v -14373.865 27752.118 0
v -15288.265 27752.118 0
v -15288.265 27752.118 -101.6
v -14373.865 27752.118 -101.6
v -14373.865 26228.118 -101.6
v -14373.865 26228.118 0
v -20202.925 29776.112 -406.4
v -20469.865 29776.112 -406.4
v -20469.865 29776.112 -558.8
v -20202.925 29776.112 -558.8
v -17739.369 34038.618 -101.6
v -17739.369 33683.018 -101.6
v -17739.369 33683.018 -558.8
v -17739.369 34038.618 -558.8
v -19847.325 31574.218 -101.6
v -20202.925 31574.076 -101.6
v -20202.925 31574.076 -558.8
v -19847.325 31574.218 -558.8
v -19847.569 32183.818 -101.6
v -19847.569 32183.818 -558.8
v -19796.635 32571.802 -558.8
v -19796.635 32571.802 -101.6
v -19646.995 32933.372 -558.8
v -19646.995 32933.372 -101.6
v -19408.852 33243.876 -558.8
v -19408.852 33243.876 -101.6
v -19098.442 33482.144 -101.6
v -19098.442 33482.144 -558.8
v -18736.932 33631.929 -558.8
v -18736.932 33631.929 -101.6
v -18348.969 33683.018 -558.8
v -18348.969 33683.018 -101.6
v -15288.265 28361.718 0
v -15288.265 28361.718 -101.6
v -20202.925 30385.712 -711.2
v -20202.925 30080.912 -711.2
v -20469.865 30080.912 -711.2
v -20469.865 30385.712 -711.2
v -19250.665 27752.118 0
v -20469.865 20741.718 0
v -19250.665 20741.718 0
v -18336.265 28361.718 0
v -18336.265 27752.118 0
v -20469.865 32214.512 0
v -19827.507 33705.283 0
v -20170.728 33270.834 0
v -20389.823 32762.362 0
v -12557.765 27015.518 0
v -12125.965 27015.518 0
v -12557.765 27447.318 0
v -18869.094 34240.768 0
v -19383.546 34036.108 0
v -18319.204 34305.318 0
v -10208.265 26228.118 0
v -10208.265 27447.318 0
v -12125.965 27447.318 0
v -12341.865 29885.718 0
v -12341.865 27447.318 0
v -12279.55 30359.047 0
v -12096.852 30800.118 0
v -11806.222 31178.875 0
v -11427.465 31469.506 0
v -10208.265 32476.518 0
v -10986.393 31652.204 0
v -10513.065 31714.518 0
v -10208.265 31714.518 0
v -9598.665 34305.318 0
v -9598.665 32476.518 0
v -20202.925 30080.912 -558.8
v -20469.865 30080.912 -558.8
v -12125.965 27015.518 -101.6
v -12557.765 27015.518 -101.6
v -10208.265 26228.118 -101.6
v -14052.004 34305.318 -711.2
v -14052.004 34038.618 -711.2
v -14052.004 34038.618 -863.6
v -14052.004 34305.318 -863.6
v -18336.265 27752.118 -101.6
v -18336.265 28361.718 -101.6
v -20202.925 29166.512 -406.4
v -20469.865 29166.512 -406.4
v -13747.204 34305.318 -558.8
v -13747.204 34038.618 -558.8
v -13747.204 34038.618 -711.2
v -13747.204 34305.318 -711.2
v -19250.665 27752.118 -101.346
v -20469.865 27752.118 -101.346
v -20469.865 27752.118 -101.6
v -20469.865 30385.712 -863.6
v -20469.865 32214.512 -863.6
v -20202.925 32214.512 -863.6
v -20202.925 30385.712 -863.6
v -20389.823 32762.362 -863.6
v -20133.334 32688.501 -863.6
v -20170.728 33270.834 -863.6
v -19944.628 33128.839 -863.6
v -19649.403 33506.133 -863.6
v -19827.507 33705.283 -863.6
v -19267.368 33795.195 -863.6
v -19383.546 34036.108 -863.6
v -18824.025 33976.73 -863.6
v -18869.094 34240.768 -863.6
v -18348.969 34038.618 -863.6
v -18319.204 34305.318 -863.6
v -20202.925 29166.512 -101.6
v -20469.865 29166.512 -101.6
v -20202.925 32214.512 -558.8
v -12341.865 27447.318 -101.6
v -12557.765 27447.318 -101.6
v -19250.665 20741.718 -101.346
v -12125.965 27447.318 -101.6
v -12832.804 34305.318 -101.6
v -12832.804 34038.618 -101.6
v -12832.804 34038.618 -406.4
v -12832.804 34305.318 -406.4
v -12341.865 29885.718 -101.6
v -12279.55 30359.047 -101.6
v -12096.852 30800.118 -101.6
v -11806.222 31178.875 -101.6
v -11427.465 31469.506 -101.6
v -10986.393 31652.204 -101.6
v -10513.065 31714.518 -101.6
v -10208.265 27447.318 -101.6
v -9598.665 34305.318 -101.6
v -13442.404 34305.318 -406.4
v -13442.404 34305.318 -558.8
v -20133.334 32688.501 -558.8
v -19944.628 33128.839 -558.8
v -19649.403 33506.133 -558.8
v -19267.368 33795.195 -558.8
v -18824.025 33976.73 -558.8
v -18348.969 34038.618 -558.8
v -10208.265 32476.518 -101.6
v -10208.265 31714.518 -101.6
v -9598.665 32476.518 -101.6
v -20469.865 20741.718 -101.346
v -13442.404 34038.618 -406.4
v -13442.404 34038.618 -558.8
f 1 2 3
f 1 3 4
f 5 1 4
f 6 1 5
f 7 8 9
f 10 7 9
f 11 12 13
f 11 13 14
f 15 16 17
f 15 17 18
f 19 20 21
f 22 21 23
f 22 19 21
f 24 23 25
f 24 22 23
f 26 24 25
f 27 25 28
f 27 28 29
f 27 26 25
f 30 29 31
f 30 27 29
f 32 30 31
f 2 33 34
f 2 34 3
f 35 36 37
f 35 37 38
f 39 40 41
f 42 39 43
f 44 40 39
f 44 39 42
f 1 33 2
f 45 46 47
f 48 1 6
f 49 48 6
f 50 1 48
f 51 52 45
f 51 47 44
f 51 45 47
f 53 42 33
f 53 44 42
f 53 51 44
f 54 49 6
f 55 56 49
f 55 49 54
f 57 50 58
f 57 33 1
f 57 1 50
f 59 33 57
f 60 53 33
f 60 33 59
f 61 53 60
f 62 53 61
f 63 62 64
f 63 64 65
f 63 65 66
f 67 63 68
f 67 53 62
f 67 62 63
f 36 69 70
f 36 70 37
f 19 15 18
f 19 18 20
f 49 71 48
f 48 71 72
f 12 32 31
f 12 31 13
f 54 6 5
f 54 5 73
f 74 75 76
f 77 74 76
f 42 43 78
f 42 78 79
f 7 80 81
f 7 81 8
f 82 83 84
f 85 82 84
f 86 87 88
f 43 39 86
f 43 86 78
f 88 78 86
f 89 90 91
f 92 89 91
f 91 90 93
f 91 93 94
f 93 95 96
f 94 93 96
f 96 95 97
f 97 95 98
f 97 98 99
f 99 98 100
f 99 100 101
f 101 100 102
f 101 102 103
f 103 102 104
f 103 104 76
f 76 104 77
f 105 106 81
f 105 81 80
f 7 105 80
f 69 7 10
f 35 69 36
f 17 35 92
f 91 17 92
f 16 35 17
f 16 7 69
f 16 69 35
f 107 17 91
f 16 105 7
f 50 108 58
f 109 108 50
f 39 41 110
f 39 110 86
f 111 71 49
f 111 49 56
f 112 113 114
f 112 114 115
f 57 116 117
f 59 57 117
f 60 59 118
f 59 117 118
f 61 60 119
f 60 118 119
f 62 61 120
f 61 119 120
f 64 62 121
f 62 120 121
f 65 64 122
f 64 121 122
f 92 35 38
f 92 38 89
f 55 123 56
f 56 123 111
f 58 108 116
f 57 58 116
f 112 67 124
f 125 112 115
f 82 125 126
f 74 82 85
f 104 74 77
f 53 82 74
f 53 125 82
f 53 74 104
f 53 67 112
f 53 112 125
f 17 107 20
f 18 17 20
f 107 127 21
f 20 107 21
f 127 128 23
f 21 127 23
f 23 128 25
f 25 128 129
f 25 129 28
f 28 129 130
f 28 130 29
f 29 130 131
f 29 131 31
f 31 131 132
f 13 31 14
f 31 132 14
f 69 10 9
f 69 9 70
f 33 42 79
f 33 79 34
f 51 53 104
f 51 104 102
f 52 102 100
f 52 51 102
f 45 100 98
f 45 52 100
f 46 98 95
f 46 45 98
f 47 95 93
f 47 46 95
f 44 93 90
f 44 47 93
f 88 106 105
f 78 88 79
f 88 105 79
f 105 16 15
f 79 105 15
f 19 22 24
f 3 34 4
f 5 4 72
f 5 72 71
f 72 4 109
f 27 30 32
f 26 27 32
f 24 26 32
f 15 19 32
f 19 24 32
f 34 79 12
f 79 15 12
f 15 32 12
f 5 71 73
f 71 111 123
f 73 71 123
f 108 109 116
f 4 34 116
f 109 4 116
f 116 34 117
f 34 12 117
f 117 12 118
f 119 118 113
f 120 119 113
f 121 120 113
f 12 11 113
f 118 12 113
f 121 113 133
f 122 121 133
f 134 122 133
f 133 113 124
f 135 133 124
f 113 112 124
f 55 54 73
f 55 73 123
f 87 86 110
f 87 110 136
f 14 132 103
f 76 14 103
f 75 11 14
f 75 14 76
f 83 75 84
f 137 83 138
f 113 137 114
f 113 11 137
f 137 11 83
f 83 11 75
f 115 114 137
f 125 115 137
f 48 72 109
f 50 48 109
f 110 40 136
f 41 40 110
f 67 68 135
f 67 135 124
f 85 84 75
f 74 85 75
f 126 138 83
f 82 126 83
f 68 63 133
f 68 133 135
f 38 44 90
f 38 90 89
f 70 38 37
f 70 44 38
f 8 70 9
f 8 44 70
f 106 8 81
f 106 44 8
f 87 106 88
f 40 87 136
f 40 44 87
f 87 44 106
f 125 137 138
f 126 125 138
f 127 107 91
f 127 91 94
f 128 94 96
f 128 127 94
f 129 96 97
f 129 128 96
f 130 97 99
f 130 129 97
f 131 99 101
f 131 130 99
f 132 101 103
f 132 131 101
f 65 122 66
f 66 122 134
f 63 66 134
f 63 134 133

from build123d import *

# Parameters (mm, degrees)
BOSS_EXTRUDE1_DEPTH = 101.6
BOSS_EXTRUDE2_DEPTH = 558.8
BOSS_EXTRUDE3_DEPTH = 863.6
CUT_EXTRUDE1_DEPTH  = 24425.756146057
CUT_EXTRUDE2_DEPTH  = 35918.479626981
CUT_EXTRUDE3_DEPTH  = 39956.790586087
SKETCH6_W           = 431.8
SKETCH6_H           = 431.8
CUT_EXTRUDE4_DEPTH  = 39956.790586087
SKETCH7_W           = 1219.2
SKETCH7_H           = 7010.4
CUT_EXTRUDE5_DEPTH  = 0.254


with BuildPart() as part:
    # Sketch1 → Boss-Extrude1 (new body)
    with BuildSketch(Plane.XY):
        with BuildLine():
            Line((-20469.8646362, 20741.718375844), (-19250.6646362, 20741.718375844))
            Line((-19250.6646362, 20741.718375844), (-19250.6646362, 27752.118375844))
            Line((-19250.6646362, 27752.118375844), (-18336.2646362, 27752.118375844))
            Line((-18336.2646362, 27752.118375844), (-18336.2646362, 28361.718375844))
            Line((-18336.2646362, 28361.718375844), (-15288.2646362, 28361.718375844))
            Line((-15288.2646362, 28361.718375844), (-15288.2646362, 27752.118375844))
            Line((-15288.2646362, 27752.118375844), (-14373.8646362, 27752.118375844))
            Line((-14373.8646362, 27752.118375844), (-14373.8646362, 26228.118375844))
            Line((-14373.8646362, 26228.118375844), (-10208.2646362, 26228.118375844))
            Line((-10208.2646362, 26228.118375844), (-10208.2646362, 32476.518375844))
            Line((-10208.2646362, 32476.518375844), (-9598.6646362, 32476.518375844))
            Line((-9598.6646362, 32476.518375844), (-9598.6646362, 34305.318375844))
            Line((-9598.6646362, 34305.318375844), (-12832.803535515, 34305.318375844))
            Line((-12832.803535515, 34305.318375844), (-12832.803535515, 34038.618375844))
            Line((-12832.803535515, 34038.618375844), (-17739.369265567, 34038.618375844))
            Line((-17739.369265567, 34038.618375844), (-17739.369265567, 33683.018375844))
            Line((-17739.369265567, 33683.018375844), (-18348.969265567, 33683.018375844))
            ThreePointArc((-18348.969265567, 33683.018375844), (-19408.851608728, 33243.876434785), (-19847.569145444, 32183.818347357))
            Line((-19847.569145444, 32183.818347357), (-19847.325066059, 31574.218396221))
            Line((-19847.325066059, 31574.218396221), (-20202.925037555, 31574.07601658))
            Line((-20202.925037555, 31574.07601658), (-20202.925037555, 29166.512154459))
            Line((-20202.925037555, 29166.512154459), (-20469.8646362, 29166.512154459))
            Line((-20469.8646362, 29166.512154459), (-20469.8646362, 20741.718375844))
        make_face()
    extrude(amount=-BOSS_EXTRUDE1_DEPTH)

    # Sketch1<15> → Boss-Extrude2 (add)
    with BuildSketch(Plane.XY):
        with BuildLine():
            Line((-20202.925037555, 32214.512154459), (-20202.925037555, 31574.07601658))
            Line((-20202.925037555, 31574.07601658), (-19847.325066059, 31574.218396221))
            Line((-19847.325066059, 31574.218396221), (-19847.569145444, 32183.818347357))
            ThreePointArc((-19847.569145444, 32183.818347357), (-19408.851608728, 33243.876434785), (-18348.969265567, 33683.018375844))
            Line((-18348.969265567, 33683.018375844), (-17739.369265567, 33683.018375844))
            Line((-17739.369265567, 33683.018375844), (-17739.369265567, 34038.618375844))
            Line((-17739.369265567, 34038.618375844), (-18348.969265567, 34038.618375844))
            ThreePointArc((-18348.969265567, 34038.618375844), (-19649.403376872, 33506.132702828), (-20202.925037555, 32214.512154459))
        make_face()
    extrude(amount=-BOSS_EXTRUDE2_DEPTH)

    # Sketch1<17> → Boss-Extrude3 (add)
    with BuildSketch(Plane.XY):
        with BuildLine():
            Line((-20469.864636201, 32214.512154459), (-20469.8646362, 29166.512154459))
            Line((-20469.8646362, 29166.512154459), (-20202.925037555, 29166.512154459))
            Line((-20202.925037555, 29166.512154459), (-20202.925037555, 31574.07601658))
            Line((-20202.925037555, 31574.07601658), (-20202.925037555, 32214.512154459))
            ThreePointArc((-20202.925037555, 32214.512154459), (-19649.403376872, 33506.132702828), (-18348.969265567, 34038.618375844))
            Line((-18348.969265567, 34038.618375844), (-17739.369265567, 34038.618375844))
            Line((-17739.369265567, 34038.618375844), (-12832.803535515, 34038.618375844))
            Line((-12832.803535515, 34038.618375844), (-12832.803535515, 34305.318375844))
            Line((-12832.803535515, 34305.318375844), (-18319.203535515, 34305.318375844))
            ThreePointArc((-18319.203535515, 34305.318375844), (-19827.50687323, 33705.283048131), (-20469.864636201, 32214.512154459))
        make_face()
    extrude(amount=-BOSS_EXTRUDE3_DEPTH)

    # Sketch3 → Cut-Extrude1 (cut, through all)
    with BuildSketch(Plane.XZ.offset(-34038.618375844)):
        Polygon((-13747.203535515, -558.8), (-13747.203535515, -711.2), (-14052.003535515, -711.2), (-14052.003535515, -863.6), (-12832.803535515, -863.6), (-12832.803535515, -406.4), (-13442.403535515, -406.4), (-13442.403535515, -558.8), align=None)
    extrude(amount=-CUT_EXTRUDE1_DEPTH, mode=Mode.SUBTRACT)

    # Sketch4 → Cut-Extrude2 (cut, through all)
    with BuildSketch(Plane(origin=(-20202.925037555, 0, 0), x_dir=(0, 0, -1), z_dir=(1, 0, 0))):
        Polygon((863.6, 29166.51215446), (406.4, 29166.51215446), (406.4, 29776.11215446), (558.8, 29776.11215446), (558.8, 30080.91215446), (711.2, 30080.91215446), (711.2, 30385.71215446), (863.6, 30385.71215446), (863.6, 30080.91215446), align=None)
    extrude(amount=-CUT_EXTRUDE2_DEPTH, mode=Mode.SUBTRACT)

    # Sketch5 → Cut-Extrude3 (cut, through all)
    with BuildSketch(Plane(origin=(0, 0, -101.6), x_dir=(-1, 0, 0), z_dir=(0, 0, -1))):
        with BuildLine():
            Line((10208.2646362, 27447.318375844), (12341.8646362, 27447.318375844))
            Line((12341.8646362, 27447.318375844), (12341.8646362, 29885.718375844))
            ThreePointArc((12341.8646362, 29885.718375844), (11806.221517634, 31178.875257278), (10513.0646362, 31714.518375844))
            Line((10513.0646362, 31714.518375844), (10208.2646362, 31714.518375844))
            Line((10208.2646362, 31714.518375844), (10208.2646362, 27447.318375844))
        make_face()
    extrude(amount=-CUT_EXTRUDE3_DEPTH, mode=Mode.SUBTRACT)

    # Sketch6 → Cut-Extrude4 (cut, through all)
    with BuildSketch(Plane(origin=(0, 0, -101.6), x_dir=(-1, 0, 0), z_dir=(0, 0, -1))):
        with Locations((12341.8646362, 27231.418375844)):
            Rectangle(SKETCH6_W, SKETCH6_H)
    extrude(amount=-CUT_EXTRUDE4_DEPTH, mode=Mode.SUBTRACT)

    # Sketch7 → Cut-Extrude5 (cut)
    with BuildSketch(Plane(origin=(0, 0, -101.6), x_dir=(-1, 0, 0), z_dir=(0, 0, -1))):
        with Locations((19860.2646362, 24246.918375844)):
            Rectangle(SKETCH7_W, SKETCH7_H)
    extrude(amount=-CUT_EXTRUDE5_DEPTH, mode=Mode.SUBTRACT)


solid = part.part
